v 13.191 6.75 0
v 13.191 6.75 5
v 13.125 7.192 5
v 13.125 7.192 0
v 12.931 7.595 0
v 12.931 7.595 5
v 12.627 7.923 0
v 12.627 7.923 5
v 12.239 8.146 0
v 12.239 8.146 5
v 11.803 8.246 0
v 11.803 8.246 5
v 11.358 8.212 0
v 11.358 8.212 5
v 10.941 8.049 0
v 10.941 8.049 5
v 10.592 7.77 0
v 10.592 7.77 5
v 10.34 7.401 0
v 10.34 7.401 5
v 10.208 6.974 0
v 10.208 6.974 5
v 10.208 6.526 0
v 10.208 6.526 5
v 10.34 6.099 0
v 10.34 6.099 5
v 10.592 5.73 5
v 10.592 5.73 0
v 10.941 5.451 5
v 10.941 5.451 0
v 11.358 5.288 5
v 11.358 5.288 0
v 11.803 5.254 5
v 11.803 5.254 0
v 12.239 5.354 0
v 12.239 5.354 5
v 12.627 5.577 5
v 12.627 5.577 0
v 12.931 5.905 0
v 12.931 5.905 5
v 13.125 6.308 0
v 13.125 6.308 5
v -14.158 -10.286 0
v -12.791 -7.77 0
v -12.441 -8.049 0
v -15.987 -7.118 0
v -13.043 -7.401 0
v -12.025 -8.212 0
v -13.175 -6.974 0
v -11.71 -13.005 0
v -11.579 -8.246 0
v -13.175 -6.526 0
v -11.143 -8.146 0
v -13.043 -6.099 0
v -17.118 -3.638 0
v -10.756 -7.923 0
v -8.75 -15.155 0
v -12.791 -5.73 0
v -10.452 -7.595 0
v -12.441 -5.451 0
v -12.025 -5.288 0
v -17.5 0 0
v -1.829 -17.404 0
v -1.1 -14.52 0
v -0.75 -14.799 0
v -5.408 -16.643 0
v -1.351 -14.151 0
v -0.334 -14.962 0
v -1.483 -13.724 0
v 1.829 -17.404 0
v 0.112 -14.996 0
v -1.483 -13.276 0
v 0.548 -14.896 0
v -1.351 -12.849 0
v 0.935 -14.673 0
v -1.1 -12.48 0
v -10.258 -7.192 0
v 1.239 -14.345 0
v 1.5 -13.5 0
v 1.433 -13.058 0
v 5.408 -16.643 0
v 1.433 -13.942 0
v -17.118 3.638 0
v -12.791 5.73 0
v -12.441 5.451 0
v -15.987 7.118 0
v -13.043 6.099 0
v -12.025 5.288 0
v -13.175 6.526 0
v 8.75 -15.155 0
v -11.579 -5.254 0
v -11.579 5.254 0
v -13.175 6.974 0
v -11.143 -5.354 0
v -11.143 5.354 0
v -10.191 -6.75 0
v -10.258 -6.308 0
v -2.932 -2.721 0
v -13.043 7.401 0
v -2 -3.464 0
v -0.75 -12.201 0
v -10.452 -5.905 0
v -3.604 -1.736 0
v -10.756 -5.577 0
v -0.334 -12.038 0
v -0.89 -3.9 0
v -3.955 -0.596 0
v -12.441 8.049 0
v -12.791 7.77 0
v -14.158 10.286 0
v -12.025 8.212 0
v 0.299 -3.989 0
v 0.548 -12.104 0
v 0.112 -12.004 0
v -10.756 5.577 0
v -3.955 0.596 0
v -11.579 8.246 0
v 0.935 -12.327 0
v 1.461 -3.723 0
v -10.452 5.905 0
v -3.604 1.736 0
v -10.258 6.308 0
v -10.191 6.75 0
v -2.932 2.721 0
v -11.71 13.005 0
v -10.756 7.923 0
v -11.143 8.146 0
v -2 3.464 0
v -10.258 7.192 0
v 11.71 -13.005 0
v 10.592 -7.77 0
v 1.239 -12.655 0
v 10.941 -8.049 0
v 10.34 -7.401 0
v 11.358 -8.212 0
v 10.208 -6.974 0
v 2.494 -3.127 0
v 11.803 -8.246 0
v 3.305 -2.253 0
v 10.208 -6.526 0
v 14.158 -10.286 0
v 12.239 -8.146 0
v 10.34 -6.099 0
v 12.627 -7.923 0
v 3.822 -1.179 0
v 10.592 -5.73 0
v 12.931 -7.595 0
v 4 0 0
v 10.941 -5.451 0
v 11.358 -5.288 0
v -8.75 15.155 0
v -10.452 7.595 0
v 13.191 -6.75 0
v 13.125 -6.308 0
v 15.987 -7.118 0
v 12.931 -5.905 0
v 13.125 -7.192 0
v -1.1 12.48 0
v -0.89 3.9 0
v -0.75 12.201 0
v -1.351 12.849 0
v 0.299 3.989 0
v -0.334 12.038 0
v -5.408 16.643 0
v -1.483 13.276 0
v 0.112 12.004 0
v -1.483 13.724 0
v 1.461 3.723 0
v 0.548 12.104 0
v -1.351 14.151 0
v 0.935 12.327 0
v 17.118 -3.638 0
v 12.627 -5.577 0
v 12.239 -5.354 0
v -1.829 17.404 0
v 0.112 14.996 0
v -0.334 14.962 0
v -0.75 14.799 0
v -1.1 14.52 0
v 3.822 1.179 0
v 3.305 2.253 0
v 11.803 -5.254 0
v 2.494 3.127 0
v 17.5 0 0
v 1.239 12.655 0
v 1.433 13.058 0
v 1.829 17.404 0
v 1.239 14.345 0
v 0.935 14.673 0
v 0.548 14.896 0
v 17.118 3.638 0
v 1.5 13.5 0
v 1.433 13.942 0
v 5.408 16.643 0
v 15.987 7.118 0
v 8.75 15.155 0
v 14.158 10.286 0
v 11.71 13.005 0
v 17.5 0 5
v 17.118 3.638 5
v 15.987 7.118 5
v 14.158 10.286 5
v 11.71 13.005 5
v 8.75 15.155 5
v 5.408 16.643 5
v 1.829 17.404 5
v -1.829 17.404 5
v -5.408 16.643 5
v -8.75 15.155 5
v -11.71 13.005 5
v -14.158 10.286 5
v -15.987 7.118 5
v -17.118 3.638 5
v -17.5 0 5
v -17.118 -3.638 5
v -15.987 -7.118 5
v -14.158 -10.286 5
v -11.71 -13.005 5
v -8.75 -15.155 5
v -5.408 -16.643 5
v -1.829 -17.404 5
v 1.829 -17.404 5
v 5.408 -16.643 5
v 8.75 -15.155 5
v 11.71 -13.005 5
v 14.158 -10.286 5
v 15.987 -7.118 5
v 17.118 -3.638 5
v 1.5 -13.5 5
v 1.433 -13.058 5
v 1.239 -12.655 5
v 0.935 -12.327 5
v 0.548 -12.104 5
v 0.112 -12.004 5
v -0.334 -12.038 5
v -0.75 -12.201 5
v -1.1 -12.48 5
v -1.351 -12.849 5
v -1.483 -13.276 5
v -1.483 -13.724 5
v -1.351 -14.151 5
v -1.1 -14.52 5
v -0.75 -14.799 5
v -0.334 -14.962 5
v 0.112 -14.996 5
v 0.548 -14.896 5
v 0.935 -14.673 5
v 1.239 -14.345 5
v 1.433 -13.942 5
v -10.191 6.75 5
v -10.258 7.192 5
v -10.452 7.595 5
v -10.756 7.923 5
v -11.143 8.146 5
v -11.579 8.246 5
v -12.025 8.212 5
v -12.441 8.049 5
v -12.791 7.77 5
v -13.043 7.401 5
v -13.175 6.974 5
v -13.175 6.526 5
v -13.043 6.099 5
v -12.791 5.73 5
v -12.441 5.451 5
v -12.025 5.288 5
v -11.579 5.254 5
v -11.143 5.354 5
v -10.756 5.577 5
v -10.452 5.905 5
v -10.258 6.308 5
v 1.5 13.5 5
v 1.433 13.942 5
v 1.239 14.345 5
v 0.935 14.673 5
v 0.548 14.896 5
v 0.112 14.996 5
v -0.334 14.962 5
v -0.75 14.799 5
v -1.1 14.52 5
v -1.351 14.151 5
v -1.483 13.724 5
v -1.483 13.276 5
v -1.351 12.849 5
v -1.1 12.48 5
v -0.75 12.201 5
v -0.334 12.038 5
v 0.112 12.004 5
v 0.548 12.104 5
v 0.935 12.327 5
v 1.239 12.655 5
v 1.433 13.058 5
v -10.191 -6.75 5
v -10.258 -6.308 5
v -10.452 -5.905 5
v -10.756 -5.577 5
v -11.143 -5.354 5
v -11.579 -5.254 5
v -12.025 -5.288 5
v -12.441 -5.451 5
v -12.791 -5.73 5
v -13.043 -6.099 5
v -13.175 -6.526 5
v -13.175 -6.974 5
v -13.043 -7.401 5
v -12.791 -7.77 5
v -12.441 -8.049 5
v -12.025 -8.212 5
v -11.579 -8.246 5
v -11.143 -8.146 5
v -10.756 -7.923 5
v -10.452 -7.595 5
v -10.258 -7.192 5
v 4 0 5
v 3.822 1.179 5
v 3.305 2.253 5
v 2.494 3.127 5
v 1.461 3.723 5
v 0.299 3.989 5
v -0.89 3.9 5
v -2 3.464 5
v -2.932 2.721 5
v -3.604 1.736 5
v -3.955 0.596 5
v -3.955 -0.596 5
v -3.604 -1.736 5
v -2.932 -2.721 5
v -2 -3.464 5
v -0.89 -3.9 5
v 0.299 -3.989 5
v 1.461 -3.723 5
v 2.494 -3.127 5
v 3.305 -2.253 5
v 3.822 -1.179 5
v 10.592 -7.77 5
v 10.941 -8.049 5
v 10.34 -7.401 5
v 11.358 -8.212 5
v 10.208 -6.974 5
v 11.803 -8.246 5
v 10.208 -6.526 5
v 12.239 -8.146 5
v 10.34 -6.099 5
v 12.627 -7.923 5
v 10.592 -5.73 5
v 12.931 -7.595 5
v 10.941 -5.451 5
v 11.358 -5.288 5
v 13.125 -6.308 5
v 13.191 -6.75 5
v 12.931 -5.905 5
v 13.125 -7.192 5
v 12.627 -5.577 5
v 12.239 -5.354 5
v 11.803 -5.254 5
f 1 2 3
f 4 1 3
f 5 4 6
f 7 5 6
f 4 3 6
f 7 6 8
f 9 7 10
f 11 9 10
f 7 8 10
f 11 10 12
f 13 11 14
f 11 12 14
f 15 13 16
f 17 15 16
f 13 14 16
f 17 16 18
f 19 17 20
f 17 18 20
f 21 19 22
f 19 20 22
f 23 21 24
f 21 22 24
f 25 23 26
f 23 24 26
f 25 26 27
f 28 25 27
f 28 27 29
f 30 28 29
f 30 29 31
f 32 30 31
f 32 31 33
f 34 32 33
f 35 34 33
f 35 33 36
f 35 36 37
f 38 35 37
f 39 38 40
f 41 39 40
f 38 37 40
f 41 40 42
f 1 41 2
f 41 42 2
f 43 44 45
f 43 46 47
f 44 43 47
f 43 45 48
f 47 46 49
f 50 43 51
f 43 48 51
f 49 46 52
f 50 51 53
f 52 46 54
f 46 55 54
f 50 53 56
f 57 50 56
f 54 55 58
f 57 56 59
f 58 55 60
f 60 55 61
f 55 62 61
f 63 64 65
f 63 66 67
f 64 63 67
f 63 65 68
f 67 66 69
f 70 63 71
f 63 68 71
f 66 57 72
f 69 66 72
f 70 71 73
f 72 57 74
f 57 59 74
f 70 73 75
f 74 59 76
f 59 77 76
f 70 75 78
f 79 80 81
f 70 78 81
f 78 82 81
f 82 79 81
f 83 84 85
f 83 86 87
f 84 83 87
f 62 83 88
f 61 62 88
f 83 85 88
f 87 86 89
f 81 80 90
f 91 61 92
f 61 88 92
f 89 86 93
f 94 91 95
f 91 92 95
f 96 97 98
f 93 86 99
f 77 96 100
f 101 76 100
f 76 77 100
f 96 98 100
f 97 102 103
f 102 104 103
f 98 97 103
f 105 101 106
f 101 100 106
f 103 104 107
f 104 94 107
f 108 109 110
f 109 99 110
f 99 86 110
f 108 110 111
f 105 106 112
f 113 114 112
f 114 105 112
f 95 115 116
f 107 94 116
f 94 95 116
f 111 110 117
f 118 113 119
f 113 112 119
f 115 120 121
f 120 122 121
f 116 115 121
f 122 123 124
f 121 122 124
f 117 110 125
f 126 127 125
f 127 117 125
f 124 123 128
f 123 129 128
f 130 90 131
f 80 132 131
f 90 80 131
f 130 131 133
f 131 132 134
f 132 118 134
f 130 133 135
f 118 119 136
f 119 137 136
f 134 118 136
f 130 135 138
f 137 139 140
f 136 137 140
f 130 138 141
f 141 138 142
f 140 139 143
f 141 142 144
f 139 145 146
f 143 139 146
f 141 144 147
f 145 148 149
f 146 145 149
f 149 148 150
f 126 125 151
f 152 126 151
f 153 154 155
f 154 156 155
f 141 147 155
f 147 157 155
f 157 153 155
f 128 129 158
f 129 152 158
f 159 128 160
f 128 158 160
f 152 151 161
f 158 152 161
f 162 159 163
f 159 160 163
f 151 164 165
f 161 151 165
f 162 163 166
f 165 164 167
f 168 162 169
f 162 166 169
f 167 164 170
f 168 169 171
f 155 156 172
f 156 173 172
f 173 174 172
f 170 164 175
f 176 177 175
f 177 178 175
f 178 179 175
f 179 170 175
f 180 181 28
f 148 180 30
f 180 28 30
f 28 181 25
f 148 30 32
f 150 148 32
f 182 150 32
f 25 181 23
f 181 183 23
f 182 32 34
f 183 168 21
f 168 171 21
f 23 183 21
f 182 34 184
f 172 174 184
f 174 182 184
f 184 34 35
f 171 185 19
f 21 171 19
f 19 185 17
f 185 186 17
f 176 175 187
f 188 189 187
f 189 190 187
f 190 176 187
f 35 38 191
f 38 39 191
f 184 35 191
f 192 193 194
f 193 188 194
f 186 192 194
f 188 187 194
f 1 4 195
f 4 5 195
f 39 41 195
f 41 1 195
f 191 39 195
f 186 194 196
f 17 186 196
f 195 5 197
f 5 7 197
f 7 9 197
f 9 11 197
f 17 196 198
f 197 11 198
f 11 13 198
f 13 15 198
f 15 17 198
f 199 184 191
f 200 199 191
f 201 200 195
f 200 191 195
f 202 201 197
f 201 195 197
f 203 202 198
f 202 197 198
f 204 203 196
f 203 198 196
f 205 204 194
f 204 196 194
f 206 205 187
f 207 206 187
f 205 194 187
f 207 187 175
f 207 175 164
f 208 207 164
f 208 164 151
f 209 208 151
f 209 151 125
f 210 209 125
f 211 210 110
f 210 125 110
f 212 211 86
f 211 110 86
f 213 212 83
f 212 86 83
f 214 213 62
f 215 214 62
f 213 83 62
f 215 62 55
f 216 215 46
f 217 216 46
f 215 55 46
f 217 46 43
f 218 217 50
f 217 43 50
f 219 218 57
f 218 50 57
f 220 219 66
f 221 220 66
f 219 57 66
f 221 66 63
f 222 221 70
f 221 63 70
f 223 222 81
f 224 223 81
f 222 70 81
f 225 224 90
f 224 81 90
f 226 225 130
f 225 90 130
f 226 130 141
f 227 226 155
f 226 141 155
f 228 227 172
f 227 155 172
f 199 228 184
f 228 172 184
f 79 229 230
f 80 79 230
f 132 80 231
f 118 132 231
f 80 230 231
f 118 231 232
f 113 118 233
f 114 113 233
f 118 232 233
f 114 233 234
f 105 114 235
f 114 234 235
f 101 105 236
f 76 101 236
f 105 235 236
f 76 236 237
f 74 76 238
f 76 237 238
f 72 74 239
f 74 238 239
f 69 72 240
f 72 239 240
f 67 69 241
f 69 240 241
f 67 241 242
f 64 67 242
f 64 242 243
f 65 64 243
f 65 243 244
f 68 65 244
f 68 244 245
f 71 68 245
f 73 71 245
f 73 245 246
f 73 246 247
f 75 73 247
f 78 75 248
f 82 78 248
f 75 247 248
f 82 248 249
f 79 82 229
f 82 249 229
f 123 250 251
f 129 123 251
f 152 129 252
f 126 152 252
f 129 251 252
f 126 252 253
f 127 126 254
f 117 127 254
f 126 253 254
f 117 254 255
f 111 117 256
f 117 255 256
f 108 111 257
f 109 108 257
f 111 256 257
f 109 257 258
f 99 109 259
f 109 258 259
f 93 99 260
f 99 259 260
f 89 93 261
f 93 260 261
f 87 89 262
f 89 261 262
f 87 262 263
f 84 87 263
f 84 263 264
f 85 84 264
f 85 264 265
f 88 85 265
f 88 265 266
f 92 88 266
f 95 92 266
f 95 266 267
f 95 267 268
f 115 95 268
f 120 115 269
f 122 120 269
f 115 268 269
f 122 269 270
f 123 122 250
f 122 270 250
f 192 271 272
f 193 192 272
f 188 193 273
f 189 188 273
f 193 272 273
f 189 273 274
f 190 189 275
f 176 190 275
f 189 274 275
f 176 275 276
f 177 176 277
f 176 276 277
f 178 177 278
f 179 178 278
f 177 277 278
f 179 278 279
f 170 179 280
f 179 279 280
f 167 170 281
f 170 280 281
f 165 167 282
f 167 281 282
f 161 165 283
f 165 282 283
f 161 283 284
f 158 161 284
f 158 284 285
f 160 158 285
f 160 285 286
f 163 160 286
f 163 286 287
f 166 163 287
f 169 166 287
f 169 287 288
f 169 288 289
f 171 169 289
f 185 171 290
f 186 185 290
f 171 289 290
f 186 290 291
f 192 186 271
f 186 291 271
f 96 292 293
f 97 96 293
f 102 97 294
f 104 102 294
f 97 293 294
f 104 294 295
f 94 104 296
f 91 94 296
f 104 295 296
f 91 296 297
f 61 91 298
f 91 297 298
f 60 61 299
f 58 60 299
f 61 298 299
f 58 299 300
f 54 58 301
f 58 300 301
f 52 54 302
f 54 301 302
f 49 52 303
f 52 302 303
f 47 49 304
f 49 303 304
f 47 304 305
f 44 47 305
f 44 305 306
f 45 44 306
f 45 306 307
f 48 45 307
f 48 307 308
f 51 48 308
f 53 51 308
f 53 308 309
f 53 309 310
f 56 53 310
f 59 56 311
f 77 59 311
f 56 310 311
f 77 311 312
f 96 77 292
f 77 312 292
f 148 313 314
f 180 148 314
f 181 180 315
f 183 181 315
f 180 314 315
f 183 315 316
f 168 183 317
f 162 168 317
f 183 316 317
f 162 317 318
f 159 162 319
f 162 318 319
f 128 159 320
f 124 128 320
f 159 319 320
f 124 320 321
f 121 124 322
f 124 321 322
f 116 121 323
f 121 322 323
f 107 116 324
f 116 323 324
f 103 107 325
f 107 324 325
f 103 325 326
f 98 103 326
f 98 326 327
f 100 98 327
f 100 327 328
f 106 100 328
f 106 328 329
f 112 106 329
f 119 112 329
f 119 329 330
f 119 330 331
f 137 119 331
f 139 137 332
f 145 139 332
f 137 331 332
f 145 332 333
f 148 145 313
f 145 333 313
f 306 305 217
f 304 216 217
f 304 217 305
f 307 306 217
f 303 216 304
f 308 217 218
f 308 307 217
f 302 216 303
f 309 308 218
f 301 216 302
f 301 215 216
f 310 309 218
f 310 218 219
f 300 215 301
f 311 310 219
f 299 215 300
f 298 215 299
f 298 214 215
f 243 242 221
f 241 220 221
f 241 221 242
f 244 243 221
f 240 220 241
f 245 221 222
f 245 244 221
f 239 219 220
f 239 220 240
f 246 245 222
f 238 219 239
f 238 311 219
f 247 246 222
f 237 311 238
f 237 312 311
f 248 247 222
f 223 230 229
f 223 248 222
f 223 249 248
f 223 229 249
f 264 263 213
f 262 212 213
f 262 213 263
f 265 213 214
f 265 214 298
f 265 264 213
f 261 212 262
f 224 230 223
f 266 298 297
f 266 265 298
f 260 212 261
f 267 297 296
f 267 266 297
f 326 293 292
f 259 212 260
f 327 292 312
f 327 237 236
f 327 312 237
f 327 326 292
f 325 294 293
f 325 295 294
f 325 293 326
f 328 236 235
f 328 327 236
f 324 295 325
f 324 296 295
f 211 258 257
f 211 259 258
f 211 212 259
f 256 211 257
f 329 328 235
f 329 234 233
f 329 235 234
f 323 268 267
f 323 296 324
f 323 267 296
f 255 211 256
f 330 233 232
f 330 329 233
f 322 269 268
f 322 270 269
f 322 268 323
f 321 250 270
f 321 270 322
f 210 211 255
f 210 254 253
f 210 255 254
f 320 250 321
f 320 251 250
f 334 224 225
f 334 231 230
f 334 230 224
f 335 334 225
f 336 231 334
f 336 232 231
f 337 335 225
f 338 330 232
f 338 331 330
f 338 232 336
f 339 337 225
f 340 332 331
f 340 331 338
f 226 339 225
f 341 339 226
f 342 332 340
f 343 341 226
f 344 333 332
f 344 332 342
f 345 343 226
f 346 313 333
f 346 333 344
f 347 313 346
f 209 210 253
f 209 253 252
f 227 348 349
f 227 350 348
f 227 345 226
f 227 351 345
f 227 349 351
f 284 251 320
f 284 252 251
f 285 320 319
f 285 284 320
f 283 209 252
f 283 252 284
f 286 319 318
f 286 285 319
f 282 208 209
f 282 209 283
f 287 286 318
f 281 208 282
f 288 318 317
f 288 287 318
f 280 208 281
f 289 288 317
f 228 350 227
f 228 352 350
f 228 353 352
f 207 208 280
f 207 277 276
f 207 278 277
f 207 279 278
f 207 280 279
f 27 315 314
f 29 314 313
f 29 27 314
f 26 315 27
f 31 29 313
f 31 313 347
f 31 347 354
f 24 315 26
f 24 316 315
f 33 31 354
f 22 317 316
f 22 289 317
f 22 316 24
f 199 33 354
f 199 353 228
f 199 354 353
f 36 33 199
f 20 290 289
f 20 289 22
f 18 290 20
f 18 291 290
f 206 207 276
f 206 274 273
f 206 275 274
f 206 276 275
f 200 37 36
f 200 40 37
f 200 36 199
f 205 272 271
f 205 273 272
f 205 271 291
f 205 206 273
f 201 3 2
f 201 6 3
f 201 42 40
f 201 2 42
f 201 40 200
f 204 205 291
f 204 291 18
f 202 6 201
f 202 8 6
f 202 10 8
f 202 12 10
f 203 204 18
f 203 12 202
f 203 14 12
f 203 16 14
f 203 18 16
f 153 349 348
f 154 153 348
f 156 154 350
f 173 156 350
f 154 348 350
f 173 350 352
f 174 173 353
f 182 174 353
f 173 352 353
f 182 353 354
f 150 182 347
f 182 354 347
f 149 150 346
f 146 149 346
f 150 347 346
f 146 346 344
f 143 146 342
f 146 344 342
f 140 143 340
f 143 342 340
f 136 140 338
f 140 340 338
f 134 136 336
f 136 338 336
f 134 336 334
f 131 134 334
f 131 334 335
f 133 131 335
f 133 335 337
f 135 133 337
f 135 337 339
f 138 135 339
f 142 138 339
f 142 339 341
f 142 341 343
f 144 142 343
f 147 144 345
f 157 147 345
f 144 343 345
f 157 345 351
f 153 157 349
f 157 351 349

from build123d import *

# Parameters (mm, degrees)
SKETCH_1_R          = 17.5
EXTRUDE_1_DEPTH     = 5
SKETCH_2_R          = 1.5
SKETCH_2_R_2        = 4
CUT_EXTRUDE_1_DEPTH = 5


with BuildPart() as part:
    # 草图1 → 凸台-拉伸1 (new body)
    with BuildSketch(Plane.XY):
        Circle(SKETCH_1_R)
    extrude(amount=EXTRUDE_1_DEPTH)

    # 草图2 → 切除-拉伸1 (cut)
    with BuildSketch(Plane.XY.offset(5)):
        with Locations((0, 13.5)):
            Circle(SKETCH_2_R)
        with Locations((11.691342951, 6.75)):
            Circle(SKETCH_2_R)
        with Locations((11.691342951, -6.75)):
            Circle(SKETCH_2_R)
        Circle(SKETCH_2_R_2)
        with Locations((0, -13.5)):
            Circle(SKETCH_2_R)
        with Locations((-11.691342951, -6.75)):
            Circle(SKETCH_2_R)
        with Locations((-11.691342951, 6.75)):
            Circle(SKETCH_2_R)
    extrude(amount=-CUT_EXTRUDE_1_DEPTH, mode=Mode.SUBTRACT)


solid = part.part
